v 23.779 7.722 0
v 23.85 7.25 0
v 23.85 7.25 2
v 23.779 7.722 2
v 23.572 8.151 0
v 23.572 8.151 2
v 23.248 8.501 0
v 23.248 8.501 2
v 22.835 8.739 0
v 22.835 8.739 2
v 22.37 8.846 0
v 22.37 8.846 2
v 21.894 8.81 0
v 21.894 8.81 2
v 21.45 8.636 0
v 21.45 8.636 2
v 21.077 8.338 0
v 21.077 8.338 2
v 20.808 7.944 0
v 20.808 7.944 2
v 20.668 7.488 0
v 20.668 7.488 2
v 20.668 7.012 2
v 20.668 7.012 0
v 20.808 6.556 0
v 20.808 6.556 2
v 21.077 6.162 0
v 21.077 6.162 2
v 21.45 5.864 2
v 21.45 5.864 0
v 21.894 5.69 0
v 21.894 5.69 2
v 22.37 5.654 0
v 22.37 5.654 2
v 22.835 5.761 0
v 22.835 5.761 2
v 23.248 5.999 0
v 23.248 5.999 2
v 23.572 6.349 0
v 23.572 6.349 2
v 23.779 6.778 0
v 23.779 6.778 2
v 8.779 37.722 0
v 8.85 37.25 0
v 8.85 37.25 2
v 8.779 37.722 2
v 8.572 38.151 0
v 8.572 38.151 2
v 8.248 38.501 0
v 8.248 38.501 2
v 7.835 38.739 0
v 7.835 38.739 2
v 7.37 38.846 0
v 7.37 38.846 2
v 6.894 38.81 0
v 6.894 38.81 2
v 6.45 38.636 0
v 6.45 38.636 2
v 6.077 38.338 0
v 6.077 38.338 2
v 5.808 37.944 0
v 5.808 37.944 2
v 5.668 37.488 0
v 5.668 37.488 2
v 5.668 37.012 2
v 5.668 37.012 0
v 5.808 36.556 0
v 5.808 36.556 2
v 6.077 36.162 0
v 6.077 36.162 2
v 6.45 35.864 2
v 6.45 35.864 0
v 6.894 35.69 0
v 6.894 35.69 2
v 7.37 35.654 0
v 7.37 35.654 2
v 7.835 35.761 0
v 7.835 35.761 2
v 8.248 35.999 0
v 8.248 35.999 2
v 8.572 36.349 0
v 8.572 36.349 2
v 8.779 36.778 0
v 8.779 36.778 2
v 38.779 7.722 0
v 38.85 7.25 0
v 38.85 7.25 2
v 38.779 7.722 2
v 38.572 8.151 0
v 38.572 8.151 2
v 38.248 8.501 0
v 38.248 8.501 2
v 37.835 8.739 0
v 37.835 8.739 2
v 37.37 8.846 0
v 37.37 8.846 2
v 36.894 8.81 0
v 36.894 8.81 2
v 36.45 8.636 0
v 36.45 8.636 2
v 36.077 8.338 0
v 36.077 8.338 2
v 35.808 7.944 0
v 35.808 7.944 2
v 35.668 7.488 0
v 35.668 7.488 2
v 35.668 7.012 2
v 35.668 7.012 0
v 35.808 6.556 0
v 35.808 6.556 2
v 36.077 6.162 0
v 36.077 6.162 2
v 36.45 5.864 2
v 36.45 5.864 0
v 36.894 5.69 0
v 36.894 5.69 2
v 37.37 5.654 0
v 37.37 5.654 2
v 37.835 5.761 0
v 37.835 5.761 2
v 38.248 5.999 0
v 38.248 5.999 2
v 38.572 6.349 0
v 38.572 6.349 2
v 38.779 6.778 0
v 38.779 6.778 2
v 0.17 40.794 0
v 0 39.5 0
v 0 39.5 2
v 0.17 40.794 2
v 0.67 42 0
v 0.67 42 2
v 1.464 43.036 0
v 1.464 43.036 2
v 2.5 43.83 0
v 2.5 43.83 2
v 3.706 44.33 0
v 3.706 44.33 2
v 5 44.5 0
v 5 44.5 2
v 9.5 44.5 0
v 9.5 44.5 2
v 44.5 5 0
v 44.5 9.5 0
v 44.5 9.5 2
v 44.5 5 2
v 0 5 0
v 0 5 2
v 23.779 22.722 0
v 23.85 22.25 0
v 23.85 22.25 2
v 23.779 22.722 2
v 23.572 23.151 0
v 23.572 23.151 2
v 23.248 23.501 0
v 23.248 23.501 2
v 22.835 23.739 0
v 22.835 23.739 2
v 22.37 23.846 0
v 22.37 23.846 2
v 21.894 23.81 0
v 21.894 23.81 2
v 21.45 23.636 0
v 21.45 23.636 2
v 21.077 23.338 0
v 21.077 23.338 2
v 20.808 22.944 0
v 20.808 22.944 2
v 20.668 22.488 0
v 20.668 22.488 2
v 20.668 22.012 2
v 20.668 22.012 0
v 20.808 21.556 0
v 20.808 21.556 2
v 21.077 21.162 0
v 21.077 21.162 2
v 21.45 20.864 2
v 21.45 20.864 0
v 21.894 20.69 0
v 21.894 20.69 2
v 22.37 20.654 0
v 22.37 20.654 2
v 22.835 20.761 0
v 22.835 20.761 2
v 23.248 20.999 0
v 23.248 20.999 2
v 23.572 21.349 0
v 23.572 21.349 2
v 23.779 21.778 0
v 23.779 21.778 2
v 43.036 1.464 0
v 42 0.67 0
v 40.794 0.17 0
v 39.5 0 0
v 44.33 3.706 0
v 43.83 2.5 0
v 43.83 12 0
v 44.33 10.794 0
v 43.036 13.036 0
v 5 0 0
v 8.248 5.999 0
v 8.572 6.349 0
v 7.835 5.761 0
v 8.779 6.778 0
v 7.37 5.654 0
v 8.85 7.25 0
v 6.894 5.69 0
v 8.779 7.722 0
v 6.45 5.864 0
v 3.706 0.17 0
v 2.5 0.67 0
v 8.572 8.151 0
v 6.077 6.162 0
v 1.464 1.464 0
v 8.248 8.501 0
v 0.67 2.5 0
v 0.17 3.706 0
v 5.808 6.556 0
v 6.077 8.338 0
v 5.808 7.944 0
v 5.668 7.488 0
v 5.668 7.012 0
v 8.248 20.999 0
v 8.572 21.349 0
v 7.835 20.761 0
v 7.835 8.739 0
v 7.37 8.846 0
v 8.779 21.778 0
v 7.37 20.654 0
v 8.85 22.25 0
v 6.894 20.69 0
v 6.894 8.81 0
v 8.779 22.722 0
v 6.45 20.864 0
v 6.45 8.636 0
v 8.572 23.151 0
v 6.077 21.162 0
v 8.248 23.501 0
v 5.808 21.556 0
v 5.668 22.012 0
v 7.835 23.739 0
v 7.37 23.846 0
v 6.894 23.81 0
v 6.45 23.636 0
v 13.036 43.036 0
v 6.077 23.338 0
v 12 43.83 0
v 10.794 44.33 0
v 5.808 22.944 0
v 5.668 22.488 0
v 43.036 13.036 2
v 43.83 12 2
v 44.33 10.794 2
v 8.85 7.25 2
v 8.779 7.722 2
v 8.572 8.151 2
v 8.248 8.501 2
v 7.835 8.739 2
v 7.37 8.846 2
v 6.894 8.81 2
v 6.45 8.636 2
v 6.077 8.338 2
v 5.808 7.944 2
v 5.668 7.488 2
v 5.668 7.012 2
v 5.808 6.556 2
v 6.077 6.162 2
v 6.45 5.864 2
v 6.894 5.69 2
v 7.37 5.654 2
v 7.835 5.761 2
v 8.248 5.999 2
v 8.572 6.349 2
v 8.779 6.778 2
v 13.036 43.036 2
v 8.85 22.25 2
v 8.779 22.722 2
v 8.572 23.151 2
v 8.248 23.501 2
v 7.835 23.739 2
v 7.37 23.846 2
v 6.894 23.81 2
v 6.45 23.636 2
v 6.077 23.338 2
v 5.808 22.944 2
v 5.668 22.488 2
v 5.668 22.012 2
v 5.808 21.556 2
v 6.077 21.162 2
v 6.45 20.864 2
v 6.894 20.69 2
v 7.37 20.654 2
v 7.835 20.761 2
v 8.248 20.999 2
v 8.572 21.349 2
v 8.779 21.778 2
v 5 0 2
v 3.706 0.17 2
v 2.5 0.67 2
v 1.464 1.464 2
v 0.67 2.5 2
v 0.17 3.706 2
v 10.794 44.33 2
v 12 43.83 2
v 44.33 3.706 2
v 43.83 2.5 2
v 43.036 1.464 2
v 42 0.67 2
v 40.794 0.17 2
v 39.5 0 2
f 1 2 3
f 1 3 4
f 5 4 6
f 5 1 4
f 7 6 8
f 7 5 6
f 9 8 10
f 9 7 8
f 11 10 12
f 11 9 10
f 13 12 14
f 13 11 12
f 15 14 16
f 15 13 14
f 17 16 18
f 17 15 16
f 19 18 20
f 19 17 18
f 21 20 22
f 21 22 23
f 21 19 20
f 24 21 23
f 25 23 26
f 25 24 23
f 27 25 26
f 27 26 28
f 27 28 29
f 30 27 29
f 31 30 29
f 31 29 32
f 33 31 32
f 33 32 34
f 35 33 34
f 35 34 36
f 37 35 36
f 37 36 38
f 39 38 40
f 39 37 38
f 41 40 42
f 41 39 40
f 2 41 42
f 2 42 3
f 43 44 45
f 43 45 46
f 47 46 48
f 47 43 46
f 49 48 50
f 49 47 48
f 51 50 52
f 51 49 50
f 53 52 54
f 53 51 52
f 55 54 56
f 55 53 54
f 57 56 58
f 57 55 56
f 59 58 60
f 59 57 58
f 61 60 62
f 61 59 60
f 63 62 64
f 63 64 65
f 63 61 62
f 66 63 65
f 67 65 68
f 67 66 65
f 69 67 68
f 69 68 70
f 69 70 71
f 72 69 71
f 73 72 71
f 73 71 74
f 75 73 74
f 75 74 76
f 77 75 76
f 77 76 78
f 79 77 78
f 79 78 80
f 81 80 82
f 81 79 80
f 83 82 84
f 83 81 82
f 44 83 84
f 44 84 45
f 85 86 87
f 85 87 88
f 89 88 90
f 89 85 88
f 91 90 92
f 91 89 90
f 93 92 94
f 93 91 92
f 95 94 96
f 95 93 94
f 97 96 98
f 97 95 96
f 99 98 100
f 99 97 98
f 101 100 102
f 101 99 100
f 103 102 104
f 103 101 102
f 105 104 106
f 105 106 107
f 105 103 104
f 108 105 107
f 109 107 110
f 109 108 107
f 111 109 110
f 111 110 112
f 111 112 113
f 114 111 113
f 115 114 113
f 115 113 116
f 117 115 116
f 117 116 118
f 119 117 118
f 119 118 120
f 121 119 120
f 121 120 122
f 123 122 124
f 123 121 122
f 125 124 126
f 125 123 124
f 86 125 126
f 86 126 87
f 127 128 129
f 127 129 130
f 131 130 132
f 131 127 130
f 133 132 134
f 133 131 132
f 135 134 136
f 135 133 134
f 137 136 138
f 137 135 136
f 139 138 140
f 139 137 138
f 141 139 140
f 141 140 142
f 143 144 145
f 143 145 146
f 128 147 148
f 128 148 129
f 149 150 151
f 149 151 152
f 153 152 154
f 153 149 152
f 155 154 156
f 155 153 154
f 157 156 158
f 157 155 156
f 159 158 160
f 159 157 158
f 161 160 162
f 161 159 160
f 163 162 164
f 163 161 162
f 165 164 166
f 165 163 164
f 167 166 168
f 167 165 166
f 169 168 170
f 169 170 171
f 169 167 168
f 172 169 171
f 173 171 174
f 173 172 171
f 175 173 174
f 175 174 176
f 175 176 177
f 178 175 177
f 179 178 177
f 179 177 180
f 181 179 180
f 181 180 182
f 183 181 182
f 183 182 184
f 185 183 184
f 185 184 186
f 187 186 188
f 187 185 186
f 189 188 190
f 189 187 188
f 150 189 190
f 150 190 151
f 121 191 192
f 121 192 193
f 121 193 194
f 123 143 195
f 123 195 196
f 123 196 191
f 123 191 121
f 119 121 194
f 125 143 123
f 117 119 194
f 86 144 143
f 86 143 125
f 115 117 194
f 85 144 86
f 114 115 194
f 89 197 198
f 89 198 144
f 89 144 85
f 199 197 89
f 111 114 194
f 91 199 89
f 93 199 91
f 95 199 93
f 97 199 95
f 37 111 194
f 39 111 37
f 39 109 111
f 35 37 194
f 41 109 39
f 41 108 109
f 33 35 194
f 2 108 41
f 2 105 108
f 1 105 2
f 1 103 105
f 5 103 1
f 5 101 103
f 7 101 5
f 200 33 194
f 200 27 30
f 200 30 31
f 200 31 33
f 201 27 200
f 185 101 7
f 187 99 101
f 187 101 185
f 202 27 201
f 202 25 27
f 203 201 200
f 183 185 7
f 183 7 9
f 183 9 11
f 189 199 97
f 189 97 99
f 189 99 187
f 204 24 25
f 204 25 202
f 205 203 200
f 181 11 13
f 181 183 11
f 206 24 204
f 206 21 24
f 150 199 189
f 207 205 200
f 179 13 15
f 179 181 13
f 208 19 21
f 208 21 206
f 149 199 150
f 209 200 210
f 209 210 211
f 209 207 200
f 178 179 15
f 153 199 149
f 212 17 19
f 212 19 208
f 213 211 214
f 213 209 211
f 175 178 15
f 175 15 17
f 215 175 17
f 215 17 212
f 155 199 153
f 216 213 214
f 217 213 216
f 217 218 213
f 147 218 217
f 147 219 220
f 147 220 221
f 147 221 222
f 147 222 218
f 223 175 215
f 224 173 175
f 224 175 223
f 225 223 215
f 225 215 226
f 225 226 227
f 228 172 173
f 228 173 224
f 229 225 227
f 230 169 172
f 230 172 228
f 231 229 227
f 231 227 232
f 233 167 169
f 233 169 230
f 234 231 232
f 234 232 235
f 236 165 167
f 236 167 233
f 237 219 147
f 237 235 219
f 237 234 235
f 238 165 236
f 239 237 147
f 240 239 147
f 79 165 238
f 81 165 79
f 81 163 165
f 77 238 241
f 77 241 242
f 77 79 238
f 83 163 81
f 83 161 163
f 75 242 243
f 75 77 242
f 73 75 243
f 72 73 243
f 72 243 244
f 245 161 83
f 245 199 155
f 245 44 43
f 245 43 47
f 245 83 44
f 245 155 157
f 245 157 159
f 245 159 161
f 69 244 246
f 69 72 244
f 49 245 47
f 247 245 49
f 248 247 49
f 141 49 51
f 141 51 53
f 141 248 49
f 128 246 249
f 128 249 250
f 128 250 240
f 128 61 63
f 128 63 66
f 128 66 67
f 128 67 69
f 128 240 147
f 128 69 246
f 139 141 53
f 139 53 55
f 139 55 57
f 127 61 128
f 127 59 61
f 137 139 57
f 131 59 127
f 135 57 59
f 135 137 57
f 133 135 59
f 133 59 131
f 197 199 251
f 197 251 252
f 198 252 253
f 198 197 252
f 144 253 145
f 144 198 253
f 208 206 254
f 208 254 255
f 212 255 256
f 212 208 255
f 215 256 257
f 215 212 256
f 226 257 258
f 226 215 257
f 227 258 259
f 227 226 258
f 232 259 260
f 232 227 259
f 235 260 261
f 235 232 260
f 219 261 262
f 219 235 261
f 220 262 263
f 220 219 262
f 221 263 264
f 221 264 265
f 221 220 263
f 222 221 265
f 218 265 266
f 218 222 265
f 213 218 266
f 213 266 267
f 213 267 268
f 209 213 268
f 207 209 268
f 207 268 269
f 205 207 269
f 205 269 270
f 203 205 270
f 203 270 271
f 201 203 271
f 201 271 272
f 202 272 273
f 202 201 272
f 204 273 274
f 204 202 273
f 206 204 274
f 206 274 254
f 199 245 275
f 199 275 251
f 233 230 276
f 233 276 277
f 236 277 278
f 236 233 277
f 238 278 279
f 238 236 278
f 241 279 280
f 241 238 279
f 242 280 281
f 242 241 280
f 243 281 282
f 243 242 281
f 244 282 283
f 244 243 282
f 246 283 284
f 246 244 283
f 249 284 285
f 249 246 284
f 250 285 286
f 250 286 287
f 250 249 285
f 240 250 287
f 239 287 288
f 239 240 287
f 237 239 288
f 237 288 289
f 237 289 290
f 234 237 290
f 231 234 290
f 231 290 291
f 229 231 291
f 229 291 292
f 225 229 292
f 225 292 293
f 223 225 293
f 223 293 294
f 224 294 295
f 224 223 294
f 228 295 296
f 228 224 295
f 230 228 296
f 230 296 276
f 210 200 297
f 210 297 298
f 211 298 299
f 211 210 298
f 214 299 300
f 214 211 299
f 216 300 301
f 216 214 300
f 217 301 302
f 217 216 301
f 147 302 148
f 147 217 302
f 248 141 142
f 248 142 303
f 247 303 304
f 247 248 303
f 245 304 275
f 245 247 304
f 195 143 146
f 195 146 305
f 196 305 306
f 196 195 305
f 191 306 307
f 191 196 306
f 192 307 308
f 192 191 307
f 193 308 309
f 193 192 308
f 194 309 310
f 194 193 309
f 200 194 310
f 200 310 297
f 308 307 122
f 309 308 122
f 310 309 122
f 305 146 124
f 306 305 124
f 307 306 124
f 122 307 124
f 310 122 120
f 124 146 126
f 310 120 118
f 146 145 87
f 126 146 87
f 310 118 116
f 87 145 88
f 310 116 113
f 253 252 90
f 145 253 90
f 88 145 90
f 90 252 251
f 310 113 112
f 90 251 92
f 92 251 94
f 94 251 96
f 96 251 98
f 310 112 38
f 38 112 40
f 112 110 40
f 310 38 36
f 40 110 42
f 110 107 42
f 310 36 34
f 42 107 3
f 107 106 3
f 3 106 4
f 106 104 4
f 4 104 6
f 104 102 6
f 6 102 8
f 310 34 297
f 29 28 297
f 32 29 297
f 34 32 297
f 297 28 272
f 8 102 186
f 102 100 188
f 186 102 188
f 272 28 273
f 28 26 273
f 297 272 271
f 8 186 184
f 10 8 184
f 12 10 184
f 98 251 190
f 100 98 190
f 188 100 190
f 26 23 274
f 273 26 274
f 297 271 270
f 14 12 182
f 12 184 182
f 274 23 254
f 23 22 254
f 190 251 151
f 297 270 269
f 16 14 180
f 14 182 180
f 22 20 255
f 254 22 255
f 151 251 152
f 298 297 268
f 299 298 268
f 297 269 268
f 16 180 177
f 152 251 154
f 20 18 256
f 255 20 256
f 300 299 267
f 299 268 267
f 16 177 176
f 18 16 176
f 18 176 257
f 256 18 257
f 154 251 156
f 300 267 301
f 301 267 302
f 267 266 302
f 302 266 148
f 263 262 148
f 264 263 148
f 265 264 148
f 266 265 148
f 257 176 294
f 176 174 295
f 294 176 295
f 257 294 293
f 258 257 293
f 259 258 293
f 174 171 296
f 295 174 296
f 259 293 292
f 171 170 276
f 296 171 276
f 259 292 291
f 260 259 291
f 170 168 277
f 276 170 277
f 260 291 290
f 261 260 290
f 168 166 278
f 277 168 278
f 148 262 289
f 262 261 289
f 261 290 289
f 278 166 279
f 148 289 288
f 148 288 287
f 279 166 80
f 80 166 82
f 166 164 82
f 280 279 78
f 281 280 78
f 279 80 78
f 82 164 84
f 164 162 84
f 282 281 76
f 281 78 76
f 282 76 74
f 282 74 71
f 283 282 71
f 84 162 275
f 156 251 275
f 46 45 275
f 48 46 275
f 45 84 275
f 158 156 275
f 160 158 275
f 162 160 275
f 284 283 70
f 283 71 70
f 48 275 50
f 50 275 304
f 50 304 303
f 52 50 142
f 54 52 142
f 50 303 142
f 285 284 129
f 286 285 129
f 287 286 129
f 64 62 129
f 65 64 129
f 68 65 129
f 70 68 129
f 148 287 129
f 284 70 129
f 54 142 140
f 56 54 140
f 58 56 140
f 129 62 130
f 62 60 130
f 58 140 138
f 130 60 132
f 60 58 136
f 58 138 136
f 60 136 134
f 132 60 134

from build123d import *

# Parameters (mm, degrees)
SKETCH1_R           = 1.6
BOSS_EXTRUDE1_DEPTH = 2


with BuildPart() as part:
    # Sketch1 → Boss-Extrude1 (new body)
    with BuildSketch(Plane.XY):
        with BuildLine():
            Line((13.035533906, 43.035533906), (43.035533906, 13.035533906))
            ThreePointArc((43.035533906, 13.035533906), (44.119397663, 11.413417162), (44.5, 9.5))
            Line((44.5, 9.5), (44.5, 5))
            ThreePointArc((44.5, 5), (43.035533906, 1.464466094), (39.5, 0))
            Line((39.5, 0), (5, 0))
            ThreePointArc((5, 0), (1.464466094, 1.464466094), (0, 5))
            Line((0, 5), (0, 39.5))
            ThreePointArc((0, 39.5), (1.464466094, 43.035533906), (5, 44.5))
            Line((5, 44.5), (9.5, 44.5))
            ThreePointArc((9.5, 44.5), (11.413417162, 44.119397663), (13.035533906, 43.035533906))
        make_face()
        with Locations((7.25, 7.25)):
            Circle(SKETCH1_R, mode=Mode.SUBTRACT)
        with Locations((7.25, 22.25)):
            Circle(SKETCH1_R, mode=Mode.SUBTRACT)
        with Locations((7.25, 37.25)):
            Circle(SKETCH1_R, mode=Mode.SUBTRACT)
        with Locations((22.25, 7.25)):
            Circle(SKETCH1_R, mode=Mode.SUBTRACT)
        with Locations((37.25, 7.25)):
            Circle(SKETCH1_R, mode=Mode.SUBTRACT)
        with Locations((22.25, 22.25)):
            Circle(SKETCH1_R, mode=Mode.SUBTRACT)
    extrude(amount=BOSS_EXTRUDE1_DEPTH)


solid = part.part
